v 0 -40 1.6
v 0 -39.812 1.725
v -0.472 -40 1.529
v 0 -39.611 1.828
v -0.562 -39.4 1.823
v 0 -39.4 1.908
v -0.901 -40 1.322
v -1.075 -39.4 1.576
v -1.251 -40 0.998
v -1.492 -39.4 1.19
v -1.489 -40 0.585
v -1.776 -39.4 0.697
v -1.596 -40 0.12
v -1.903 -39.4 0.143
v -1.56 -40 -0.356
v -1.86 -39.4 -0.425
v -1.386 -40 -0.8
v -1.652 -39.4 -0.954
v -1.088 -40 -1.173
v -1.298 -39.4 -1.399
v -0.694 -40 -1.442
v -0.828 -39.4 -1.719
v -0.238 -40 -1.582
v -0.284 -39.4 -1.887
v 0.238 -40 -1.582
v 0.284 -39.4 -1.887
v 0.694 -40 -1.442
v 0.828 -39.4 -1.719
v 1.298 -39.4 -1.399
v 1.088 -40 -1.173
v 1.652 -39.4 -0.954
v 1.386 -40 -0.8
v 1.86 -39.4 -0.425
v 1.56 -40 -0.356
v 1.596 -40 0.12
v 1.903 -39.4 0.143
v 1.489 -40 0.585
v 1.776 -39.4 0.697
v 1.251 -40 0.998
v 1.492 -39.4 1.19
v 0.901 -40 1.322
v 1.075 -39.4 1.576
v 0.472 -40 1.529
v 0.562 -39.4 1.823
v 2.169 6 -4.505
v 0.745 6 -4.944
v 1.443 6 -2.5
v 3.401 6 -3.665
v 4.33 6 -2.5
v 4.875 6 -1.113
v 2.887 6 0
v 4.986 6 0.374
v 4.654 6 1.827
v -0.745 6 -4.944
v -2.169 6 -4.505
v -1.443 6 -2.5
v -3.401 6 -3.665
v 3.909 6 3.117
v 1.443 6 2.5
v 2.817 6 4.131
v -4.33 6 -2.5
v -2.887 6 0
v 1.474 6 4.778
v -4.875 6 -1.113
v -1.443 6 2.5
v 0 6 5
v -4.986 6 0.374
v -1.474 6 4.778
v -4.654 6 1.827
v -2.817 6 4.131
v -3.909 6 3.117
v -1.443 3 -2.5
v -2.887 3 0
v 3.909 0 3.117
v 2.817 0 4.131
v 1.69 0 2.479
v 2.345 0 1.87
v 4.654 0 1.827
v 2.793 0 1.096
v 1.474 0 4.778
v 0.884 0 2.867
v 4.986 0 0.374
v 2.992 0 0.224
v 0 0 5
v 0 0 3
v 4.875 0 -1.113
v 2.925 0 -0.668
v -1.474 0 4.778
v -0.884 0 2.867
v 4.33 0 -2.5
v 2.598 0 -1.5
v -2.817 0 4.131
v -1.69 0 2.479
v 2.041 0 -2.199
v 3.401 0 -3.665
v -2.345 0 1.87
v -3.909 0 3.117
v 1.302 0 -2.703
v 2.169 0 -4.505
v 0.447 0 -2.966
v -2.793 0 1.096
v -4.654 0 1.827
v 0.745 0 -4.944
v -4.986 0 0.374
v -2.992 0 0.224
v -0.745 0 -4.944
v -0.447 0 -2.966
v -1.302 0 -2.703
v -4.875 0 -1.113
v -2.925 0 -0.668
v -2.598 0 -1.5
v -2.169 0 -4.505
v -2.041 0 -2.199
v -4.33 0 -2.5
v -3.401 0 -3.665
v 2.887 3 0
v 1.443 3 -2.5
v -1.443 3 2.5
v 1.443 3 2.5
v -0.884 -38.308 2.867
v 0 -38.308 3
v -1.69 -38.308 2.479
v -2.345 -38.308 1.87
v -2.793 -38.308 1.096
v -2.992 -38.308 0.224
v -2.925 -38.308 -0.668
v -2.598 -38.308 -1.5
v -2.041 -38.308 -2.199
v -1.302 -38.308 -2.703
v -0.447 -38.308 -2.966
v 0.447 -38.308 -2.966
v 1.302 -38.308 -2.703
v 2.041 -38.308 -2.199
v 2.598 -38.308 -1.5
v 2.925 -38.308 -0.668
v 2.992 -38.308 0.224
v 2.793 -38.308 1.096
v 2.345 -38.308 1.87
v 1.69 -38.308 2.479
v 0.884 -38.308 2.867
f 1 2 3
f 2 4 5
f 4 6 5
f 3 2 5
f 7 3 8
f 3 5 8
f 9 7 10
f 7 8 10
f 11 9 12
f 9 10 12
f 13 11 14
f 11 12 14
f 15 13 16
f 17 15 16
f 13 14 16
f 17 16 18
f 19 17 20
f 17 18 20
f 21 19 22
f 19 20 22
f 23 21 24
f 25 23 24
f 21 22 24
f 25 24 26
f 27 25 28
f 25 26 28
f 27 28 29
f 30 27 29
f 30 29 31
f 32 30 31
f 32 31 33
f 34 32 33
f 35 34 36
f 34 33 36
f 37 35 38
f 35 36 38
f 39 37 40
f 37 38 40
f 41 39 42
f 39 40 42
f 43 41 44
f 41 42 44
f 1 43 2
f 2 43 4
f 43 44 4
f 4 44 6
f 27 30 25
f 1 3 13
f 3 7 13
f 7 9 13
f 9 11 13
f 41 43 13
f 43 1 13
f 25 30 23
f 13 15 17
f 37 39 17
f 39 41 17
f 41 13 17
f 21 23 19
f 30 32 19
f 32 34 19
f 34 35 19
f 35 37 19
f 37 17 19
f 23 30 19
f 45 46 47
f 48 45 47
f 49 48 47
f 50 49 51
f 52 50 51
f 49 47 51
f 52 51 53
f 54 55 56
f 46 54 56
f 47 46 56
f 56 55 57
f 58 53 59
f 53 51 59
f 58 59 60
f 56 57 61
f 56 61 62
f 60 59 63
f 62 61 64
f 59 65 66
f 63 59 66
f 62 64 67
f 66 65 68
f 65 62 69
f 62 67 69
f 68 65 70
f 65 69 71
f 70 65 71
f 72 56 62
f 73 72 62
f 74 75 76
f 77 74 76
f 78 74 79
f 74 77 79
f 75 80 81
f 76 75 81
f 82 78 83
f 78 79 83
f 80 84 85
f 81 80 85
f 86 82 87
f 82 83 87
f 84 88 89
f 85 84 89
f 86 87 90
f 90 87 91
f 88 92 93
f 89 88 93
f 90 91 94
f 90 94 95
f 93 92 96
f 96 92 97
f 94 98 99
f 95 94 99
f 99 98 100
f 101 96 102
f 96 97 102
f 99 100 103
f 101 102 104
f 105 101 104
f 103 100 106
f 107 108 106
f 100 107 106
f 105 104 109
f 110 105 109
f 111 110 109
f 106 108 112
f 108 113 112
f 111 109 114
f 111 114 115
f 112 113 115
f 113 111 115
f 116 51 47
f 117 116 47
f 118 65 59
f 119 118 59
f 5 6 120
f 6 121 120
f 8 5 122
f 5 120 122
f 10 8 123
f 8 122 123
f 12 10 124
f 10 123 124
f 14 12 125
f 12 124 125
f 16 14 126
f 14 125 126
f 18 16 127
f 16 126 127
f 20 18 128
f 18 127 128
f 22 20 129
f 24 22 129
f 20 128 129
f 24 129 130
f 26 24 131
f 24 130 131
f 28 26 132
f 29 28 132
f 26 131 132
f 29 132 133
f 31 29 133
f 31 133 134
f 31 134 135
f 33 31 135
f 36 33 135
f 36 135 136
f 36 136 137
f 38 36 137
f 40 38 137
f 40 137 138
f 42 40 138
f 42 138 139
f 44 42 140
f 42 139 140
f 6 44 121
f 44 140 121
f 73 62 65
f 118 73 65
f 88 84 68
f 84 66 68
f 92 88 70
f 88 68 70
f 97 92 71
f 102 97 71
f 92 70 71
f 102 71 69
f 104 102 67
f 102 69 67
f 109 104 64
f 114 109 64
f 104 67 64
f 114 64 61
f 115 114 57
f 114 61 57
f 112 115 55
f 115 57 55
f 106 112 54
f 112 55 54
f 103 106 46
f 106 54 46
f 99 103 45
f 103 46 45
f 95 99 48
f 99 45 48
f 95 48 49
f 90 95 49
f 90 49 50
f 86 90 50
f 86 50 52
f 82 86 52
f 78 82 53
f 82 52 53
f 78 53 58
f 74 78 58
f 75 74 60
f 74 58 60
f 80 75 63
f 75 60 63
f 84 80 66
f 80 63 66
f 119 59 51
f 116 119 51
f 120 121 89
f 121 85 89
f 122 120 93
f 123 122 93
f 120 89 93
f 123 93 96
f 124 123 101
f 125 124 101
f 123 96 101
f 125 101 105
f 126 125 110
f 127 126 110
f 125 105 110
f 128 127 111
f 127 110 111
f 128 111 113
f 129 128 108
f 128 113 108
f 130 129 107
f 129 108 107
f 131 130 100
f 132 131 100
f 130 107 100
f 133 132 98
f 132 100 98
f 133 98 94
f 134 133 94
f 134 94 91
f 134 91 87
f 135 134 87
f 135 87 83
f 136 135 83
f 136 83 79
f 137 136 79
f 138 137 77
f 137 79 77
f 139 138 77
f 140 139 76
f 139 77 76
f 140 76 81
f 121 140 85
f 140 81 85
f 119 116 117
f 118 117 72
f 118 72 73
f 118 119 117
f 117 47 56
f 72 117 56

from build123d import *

# Parameters (mm, degrees)
CUT_EXTRUDE1_DEPTH = 3


with BuildPart() as part:
    # Sketch1 → Revolve1 (revolve)
    with BuildSketch(Plane.XY, mode=Mode.PRIVATE) as revolve1_sk:
        with BuildLine():
            Line((0, -40), (1.6, -40))
            ThreePointArc((1.6, -40), (1.77941078, -39.713070248), (1.907878403, -39.4))
            Line((1.907878403, -39.4), (3, -38.307878403))
            Line((3, -38.307878403), (3, 0))
            Line((3, 0), (5, 0))
            Line((5, 0), (5, 6))
            Line((5, 6), (0, 6))
            Line((0, 6), (0, -40))
        make_face()
    revolve(revolve1_sk.sketch.rotate(Axis((0, 61.691642626, 0), (0, -1, 0)), 90), axis=Axis((0, 61.691642626, 0), (0, -1, 0)))

    # Sketch2 → Cut-Extrude1 (cut)
    with BuildSketch(Plane(origin=(0, 6, 0), x_dir=(-1, 0, 0), z_dir=(0, 1, 0))):
        Polygon((-1.443375673, -2.5), (1.443375673, -2.5), (2.886751346, 0), (1.443375673, 2.5), (-1.443375673, 2.5), (-2.886751346, 0), align=None)
    extrude(amount=-CUT_EXTRUDE1_DEPTH, mode=Mode.SUBTRACT)


solid = part.part
